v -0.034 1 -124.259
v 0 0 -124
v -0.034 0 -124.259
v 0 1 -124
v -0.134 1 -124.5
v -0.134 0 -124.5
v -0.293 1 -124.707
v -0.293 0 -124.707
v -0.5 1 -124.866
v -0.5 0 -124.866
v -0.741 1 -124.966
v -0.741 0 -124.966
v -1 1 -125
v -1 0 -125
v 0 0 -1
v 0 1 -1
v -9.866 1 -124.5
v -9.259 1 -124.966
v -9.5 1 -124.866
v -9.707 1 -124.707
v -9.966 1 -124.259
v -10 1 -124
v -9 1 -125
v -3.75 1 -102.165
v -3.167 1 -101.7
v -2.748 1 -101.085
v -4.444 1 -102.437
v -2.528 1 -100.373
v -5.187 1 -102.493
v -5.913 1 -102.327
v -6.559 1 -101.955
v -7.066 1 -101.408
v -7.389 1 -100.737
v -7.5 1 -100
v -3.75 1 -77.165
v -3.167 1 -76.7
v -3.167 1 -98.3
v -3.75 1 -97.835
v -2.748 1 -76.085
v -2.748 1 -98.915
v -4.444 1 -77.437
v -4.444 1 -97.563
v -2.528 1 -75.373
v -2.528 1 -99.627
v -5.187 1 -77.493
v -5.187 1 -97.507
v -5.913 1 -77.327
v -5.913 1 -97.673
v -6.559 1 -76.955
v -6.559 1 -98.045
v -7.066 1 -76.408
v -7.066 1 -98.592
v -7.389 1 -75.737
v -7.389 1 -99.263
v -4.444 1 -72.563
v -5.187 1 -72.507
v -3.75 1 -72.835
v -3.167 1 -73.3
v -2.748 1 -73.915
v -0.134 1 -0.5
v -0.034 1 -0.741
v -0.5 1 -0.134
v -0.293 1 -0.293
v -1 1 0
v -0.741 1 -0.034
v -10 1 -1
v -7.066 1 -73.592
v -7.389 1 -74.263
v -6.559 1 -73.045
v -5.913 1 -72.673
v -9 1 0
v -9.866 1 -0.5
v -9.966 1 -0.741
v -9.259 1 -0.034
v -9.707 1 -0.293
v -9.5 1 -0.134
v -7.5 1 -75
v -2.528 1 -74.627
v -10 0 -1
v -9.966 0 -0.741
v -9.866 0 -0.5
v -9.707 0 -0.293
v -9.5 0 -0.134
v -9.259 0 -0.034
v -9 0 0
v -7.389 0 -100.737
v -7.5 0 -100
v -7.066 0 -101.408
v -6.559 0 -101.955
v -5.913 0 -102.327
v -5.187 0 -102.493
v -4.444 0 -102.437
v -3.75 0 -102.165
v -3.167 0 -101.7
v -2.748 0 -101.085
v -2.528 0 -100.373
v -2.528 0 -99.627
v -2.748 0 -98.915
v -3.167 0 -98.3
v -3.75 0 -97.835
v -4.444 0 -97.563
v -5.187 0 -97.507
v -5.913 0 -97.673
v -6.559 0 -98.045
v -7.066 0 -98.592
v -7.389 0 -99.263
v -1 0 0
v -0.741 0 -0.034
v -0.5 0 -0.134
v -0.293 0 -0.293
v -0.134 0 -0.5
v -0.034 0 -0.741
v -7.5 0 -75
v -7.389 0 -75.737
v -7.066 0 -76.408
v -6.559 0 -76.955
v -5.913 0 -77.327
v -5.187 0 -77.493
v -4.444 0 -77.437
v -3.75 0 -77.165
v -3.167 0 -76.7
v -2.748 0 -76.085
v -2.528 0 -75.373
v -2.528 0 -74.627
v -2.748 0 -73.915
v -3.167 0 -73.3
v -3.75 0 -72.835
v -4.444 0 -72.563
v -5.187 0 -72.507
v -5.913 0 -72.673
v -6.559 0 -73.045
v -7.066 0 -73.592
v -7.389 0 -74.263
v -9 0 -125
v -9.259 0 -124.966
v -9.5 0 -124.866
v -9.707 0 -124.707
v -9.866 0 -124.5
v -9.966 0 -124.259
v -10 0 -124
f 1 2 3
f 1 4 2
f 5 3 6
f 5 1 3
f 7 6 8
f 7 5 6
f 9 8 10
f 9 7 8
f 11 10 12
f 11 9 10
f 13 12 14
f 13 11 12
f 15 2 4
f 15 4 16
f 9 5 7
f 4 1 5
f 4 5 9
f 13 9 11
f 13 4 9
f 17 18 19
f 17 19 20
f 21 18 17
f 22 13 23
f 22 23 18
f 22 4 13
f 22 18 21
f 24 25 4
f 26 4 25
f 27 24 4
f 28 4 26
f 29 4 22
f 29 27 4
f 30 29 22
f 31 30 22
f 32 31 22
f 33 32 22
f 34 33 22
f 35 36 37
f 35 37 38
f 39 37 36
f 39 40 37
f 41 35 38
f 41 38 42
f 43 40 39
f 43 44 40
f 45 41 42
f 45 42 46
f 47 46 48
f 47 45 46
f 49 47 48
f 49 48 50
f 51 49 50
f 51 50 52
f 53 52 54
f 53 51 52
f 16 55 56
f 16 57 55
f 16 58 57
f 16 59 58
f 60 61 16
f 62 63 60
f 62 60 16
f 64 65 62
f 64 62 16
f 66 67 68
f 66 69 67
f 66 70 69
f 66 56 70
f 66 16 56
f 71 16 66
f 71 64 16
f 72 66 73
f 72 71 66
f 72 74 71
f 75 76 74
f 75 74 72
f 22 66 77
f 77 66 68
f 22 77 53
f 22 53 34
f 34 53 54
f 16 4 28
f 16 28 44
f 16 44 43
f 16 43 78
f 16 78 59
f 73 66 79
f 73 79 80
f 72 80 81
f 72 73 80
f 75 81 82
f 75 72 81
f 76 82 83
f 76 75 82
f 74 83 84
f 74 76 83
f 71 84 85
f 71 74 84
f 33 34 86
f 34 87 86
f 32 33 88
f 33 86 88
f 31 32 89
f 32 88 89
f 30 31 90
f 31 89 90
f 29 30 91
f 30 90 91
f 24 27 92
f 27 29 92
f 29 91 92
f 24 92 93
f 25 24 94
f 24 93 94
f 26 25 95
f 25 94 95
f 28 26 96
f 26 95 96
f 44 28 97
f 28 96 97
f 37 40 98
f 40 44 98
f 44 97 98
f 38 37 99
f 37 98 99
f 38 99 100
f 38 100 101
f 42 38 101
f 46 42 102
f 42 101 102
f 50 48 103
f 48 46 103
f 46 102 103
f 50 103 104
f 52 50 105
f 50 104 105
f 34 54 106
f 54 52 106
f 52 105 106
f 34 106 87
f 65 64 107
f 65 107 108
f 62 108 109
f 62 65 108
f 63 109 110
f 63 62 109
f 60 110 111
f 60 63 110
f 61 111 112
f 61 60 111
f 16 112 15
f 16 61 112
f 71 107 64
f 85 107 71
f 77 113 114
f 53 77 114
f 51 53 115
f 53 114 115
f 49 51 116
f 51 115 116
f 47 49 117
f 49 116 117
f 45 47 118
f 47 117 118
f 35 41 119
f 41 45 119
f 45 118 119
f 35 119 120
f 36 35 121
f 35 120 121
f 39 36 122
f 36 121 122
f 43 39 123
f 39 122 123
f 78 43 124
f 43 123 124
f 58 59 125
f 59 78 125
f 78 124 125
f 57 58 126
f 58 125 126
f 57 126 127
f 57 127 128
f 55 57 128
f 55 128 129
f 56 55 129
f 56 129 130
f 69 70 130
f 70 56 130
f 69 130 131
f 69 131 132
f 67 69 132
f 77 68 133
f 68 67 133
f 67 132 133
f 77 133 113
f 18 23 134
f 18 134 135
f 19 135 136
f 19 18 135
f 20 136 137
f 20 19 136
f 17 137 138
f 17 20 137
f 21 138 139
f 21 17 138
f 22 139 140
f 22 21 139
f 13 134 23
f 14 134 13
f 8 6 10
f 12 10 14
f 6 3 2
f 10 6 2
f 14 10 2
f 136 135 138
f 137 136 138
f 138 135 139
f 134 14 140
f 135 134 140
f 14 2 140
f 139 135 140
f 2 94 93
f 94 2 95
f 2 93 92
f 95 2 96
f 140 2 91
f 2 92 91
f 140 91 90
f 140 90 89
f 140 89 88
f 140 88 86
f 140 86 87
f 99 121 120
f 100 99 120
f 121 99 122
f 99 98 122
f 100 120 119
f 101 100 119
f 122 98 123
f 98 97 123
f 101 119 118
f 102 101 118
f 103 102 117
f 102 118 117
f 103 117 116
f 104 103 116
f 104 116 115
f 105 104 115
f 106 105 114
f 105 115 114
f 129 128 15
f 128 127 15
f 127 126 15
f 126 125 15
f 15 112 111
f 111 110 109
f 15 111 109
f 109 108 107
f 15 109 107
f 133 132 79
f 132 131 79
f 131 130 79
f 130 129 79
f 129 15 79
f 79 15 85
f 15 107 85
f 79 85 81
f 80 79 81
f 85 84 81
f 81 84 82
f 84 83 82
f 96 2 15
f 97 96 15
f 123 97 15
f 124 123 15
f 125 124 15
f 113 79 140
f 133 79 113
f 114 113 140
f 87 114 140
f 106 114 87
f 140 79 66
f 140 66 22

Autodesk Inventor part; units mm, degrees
ref_plane "YZ Plane" through (0, 0, 0) normal (1, 0, 0) x (0, 1, 0)
ref_plane "XZ Plane" through (0, 0, 0) normal (0, 1, 0) x (-1, 0, 0)
ref_plane "XY Plane" through (0, 0, 0) normal (0, 0, 1) x (1, 0, 0)
sketch "Sketch1" plane through (0, 0, 0) normal (0, 1, 0) x (-1, 0, 0)
  line L0 (0, 0) -> (10, 0)
  line L1 (10, 0) -> (10, -125)
  line L2 (10, -125) -> (0, -125)
  line L3 (0, -125) -> (0, 0)
  line L4 (27.7651, -45) -> (-20.7182, -45) construction
  circle A0 centre (5, -100) radius 2.5
  circle A1 centre (5, -75) radius 2.5
  point P0 (5, -13.5)
  dimension "d0" = 125
  dimension "d1" = 10
  dimension "d2" = 25
  dimension "d3" = 25
  dimension "d4" = 80
  dimension "d7" = 5
  dimension "d9" = 5
  dimension "d11" = 31.5
extrude "Extrusion1" add sketch "Sketch1" along normal blind 1
fillet "Fillet1" radius 1 1 edges at (0, 0.5, -125)
fillet "Fillet2" radius 1 3 edges at (0, 0.5, 0) (-10, 0.5, 0) (-10, 0.5, -125)
properties part number "ConnectorStrip"
